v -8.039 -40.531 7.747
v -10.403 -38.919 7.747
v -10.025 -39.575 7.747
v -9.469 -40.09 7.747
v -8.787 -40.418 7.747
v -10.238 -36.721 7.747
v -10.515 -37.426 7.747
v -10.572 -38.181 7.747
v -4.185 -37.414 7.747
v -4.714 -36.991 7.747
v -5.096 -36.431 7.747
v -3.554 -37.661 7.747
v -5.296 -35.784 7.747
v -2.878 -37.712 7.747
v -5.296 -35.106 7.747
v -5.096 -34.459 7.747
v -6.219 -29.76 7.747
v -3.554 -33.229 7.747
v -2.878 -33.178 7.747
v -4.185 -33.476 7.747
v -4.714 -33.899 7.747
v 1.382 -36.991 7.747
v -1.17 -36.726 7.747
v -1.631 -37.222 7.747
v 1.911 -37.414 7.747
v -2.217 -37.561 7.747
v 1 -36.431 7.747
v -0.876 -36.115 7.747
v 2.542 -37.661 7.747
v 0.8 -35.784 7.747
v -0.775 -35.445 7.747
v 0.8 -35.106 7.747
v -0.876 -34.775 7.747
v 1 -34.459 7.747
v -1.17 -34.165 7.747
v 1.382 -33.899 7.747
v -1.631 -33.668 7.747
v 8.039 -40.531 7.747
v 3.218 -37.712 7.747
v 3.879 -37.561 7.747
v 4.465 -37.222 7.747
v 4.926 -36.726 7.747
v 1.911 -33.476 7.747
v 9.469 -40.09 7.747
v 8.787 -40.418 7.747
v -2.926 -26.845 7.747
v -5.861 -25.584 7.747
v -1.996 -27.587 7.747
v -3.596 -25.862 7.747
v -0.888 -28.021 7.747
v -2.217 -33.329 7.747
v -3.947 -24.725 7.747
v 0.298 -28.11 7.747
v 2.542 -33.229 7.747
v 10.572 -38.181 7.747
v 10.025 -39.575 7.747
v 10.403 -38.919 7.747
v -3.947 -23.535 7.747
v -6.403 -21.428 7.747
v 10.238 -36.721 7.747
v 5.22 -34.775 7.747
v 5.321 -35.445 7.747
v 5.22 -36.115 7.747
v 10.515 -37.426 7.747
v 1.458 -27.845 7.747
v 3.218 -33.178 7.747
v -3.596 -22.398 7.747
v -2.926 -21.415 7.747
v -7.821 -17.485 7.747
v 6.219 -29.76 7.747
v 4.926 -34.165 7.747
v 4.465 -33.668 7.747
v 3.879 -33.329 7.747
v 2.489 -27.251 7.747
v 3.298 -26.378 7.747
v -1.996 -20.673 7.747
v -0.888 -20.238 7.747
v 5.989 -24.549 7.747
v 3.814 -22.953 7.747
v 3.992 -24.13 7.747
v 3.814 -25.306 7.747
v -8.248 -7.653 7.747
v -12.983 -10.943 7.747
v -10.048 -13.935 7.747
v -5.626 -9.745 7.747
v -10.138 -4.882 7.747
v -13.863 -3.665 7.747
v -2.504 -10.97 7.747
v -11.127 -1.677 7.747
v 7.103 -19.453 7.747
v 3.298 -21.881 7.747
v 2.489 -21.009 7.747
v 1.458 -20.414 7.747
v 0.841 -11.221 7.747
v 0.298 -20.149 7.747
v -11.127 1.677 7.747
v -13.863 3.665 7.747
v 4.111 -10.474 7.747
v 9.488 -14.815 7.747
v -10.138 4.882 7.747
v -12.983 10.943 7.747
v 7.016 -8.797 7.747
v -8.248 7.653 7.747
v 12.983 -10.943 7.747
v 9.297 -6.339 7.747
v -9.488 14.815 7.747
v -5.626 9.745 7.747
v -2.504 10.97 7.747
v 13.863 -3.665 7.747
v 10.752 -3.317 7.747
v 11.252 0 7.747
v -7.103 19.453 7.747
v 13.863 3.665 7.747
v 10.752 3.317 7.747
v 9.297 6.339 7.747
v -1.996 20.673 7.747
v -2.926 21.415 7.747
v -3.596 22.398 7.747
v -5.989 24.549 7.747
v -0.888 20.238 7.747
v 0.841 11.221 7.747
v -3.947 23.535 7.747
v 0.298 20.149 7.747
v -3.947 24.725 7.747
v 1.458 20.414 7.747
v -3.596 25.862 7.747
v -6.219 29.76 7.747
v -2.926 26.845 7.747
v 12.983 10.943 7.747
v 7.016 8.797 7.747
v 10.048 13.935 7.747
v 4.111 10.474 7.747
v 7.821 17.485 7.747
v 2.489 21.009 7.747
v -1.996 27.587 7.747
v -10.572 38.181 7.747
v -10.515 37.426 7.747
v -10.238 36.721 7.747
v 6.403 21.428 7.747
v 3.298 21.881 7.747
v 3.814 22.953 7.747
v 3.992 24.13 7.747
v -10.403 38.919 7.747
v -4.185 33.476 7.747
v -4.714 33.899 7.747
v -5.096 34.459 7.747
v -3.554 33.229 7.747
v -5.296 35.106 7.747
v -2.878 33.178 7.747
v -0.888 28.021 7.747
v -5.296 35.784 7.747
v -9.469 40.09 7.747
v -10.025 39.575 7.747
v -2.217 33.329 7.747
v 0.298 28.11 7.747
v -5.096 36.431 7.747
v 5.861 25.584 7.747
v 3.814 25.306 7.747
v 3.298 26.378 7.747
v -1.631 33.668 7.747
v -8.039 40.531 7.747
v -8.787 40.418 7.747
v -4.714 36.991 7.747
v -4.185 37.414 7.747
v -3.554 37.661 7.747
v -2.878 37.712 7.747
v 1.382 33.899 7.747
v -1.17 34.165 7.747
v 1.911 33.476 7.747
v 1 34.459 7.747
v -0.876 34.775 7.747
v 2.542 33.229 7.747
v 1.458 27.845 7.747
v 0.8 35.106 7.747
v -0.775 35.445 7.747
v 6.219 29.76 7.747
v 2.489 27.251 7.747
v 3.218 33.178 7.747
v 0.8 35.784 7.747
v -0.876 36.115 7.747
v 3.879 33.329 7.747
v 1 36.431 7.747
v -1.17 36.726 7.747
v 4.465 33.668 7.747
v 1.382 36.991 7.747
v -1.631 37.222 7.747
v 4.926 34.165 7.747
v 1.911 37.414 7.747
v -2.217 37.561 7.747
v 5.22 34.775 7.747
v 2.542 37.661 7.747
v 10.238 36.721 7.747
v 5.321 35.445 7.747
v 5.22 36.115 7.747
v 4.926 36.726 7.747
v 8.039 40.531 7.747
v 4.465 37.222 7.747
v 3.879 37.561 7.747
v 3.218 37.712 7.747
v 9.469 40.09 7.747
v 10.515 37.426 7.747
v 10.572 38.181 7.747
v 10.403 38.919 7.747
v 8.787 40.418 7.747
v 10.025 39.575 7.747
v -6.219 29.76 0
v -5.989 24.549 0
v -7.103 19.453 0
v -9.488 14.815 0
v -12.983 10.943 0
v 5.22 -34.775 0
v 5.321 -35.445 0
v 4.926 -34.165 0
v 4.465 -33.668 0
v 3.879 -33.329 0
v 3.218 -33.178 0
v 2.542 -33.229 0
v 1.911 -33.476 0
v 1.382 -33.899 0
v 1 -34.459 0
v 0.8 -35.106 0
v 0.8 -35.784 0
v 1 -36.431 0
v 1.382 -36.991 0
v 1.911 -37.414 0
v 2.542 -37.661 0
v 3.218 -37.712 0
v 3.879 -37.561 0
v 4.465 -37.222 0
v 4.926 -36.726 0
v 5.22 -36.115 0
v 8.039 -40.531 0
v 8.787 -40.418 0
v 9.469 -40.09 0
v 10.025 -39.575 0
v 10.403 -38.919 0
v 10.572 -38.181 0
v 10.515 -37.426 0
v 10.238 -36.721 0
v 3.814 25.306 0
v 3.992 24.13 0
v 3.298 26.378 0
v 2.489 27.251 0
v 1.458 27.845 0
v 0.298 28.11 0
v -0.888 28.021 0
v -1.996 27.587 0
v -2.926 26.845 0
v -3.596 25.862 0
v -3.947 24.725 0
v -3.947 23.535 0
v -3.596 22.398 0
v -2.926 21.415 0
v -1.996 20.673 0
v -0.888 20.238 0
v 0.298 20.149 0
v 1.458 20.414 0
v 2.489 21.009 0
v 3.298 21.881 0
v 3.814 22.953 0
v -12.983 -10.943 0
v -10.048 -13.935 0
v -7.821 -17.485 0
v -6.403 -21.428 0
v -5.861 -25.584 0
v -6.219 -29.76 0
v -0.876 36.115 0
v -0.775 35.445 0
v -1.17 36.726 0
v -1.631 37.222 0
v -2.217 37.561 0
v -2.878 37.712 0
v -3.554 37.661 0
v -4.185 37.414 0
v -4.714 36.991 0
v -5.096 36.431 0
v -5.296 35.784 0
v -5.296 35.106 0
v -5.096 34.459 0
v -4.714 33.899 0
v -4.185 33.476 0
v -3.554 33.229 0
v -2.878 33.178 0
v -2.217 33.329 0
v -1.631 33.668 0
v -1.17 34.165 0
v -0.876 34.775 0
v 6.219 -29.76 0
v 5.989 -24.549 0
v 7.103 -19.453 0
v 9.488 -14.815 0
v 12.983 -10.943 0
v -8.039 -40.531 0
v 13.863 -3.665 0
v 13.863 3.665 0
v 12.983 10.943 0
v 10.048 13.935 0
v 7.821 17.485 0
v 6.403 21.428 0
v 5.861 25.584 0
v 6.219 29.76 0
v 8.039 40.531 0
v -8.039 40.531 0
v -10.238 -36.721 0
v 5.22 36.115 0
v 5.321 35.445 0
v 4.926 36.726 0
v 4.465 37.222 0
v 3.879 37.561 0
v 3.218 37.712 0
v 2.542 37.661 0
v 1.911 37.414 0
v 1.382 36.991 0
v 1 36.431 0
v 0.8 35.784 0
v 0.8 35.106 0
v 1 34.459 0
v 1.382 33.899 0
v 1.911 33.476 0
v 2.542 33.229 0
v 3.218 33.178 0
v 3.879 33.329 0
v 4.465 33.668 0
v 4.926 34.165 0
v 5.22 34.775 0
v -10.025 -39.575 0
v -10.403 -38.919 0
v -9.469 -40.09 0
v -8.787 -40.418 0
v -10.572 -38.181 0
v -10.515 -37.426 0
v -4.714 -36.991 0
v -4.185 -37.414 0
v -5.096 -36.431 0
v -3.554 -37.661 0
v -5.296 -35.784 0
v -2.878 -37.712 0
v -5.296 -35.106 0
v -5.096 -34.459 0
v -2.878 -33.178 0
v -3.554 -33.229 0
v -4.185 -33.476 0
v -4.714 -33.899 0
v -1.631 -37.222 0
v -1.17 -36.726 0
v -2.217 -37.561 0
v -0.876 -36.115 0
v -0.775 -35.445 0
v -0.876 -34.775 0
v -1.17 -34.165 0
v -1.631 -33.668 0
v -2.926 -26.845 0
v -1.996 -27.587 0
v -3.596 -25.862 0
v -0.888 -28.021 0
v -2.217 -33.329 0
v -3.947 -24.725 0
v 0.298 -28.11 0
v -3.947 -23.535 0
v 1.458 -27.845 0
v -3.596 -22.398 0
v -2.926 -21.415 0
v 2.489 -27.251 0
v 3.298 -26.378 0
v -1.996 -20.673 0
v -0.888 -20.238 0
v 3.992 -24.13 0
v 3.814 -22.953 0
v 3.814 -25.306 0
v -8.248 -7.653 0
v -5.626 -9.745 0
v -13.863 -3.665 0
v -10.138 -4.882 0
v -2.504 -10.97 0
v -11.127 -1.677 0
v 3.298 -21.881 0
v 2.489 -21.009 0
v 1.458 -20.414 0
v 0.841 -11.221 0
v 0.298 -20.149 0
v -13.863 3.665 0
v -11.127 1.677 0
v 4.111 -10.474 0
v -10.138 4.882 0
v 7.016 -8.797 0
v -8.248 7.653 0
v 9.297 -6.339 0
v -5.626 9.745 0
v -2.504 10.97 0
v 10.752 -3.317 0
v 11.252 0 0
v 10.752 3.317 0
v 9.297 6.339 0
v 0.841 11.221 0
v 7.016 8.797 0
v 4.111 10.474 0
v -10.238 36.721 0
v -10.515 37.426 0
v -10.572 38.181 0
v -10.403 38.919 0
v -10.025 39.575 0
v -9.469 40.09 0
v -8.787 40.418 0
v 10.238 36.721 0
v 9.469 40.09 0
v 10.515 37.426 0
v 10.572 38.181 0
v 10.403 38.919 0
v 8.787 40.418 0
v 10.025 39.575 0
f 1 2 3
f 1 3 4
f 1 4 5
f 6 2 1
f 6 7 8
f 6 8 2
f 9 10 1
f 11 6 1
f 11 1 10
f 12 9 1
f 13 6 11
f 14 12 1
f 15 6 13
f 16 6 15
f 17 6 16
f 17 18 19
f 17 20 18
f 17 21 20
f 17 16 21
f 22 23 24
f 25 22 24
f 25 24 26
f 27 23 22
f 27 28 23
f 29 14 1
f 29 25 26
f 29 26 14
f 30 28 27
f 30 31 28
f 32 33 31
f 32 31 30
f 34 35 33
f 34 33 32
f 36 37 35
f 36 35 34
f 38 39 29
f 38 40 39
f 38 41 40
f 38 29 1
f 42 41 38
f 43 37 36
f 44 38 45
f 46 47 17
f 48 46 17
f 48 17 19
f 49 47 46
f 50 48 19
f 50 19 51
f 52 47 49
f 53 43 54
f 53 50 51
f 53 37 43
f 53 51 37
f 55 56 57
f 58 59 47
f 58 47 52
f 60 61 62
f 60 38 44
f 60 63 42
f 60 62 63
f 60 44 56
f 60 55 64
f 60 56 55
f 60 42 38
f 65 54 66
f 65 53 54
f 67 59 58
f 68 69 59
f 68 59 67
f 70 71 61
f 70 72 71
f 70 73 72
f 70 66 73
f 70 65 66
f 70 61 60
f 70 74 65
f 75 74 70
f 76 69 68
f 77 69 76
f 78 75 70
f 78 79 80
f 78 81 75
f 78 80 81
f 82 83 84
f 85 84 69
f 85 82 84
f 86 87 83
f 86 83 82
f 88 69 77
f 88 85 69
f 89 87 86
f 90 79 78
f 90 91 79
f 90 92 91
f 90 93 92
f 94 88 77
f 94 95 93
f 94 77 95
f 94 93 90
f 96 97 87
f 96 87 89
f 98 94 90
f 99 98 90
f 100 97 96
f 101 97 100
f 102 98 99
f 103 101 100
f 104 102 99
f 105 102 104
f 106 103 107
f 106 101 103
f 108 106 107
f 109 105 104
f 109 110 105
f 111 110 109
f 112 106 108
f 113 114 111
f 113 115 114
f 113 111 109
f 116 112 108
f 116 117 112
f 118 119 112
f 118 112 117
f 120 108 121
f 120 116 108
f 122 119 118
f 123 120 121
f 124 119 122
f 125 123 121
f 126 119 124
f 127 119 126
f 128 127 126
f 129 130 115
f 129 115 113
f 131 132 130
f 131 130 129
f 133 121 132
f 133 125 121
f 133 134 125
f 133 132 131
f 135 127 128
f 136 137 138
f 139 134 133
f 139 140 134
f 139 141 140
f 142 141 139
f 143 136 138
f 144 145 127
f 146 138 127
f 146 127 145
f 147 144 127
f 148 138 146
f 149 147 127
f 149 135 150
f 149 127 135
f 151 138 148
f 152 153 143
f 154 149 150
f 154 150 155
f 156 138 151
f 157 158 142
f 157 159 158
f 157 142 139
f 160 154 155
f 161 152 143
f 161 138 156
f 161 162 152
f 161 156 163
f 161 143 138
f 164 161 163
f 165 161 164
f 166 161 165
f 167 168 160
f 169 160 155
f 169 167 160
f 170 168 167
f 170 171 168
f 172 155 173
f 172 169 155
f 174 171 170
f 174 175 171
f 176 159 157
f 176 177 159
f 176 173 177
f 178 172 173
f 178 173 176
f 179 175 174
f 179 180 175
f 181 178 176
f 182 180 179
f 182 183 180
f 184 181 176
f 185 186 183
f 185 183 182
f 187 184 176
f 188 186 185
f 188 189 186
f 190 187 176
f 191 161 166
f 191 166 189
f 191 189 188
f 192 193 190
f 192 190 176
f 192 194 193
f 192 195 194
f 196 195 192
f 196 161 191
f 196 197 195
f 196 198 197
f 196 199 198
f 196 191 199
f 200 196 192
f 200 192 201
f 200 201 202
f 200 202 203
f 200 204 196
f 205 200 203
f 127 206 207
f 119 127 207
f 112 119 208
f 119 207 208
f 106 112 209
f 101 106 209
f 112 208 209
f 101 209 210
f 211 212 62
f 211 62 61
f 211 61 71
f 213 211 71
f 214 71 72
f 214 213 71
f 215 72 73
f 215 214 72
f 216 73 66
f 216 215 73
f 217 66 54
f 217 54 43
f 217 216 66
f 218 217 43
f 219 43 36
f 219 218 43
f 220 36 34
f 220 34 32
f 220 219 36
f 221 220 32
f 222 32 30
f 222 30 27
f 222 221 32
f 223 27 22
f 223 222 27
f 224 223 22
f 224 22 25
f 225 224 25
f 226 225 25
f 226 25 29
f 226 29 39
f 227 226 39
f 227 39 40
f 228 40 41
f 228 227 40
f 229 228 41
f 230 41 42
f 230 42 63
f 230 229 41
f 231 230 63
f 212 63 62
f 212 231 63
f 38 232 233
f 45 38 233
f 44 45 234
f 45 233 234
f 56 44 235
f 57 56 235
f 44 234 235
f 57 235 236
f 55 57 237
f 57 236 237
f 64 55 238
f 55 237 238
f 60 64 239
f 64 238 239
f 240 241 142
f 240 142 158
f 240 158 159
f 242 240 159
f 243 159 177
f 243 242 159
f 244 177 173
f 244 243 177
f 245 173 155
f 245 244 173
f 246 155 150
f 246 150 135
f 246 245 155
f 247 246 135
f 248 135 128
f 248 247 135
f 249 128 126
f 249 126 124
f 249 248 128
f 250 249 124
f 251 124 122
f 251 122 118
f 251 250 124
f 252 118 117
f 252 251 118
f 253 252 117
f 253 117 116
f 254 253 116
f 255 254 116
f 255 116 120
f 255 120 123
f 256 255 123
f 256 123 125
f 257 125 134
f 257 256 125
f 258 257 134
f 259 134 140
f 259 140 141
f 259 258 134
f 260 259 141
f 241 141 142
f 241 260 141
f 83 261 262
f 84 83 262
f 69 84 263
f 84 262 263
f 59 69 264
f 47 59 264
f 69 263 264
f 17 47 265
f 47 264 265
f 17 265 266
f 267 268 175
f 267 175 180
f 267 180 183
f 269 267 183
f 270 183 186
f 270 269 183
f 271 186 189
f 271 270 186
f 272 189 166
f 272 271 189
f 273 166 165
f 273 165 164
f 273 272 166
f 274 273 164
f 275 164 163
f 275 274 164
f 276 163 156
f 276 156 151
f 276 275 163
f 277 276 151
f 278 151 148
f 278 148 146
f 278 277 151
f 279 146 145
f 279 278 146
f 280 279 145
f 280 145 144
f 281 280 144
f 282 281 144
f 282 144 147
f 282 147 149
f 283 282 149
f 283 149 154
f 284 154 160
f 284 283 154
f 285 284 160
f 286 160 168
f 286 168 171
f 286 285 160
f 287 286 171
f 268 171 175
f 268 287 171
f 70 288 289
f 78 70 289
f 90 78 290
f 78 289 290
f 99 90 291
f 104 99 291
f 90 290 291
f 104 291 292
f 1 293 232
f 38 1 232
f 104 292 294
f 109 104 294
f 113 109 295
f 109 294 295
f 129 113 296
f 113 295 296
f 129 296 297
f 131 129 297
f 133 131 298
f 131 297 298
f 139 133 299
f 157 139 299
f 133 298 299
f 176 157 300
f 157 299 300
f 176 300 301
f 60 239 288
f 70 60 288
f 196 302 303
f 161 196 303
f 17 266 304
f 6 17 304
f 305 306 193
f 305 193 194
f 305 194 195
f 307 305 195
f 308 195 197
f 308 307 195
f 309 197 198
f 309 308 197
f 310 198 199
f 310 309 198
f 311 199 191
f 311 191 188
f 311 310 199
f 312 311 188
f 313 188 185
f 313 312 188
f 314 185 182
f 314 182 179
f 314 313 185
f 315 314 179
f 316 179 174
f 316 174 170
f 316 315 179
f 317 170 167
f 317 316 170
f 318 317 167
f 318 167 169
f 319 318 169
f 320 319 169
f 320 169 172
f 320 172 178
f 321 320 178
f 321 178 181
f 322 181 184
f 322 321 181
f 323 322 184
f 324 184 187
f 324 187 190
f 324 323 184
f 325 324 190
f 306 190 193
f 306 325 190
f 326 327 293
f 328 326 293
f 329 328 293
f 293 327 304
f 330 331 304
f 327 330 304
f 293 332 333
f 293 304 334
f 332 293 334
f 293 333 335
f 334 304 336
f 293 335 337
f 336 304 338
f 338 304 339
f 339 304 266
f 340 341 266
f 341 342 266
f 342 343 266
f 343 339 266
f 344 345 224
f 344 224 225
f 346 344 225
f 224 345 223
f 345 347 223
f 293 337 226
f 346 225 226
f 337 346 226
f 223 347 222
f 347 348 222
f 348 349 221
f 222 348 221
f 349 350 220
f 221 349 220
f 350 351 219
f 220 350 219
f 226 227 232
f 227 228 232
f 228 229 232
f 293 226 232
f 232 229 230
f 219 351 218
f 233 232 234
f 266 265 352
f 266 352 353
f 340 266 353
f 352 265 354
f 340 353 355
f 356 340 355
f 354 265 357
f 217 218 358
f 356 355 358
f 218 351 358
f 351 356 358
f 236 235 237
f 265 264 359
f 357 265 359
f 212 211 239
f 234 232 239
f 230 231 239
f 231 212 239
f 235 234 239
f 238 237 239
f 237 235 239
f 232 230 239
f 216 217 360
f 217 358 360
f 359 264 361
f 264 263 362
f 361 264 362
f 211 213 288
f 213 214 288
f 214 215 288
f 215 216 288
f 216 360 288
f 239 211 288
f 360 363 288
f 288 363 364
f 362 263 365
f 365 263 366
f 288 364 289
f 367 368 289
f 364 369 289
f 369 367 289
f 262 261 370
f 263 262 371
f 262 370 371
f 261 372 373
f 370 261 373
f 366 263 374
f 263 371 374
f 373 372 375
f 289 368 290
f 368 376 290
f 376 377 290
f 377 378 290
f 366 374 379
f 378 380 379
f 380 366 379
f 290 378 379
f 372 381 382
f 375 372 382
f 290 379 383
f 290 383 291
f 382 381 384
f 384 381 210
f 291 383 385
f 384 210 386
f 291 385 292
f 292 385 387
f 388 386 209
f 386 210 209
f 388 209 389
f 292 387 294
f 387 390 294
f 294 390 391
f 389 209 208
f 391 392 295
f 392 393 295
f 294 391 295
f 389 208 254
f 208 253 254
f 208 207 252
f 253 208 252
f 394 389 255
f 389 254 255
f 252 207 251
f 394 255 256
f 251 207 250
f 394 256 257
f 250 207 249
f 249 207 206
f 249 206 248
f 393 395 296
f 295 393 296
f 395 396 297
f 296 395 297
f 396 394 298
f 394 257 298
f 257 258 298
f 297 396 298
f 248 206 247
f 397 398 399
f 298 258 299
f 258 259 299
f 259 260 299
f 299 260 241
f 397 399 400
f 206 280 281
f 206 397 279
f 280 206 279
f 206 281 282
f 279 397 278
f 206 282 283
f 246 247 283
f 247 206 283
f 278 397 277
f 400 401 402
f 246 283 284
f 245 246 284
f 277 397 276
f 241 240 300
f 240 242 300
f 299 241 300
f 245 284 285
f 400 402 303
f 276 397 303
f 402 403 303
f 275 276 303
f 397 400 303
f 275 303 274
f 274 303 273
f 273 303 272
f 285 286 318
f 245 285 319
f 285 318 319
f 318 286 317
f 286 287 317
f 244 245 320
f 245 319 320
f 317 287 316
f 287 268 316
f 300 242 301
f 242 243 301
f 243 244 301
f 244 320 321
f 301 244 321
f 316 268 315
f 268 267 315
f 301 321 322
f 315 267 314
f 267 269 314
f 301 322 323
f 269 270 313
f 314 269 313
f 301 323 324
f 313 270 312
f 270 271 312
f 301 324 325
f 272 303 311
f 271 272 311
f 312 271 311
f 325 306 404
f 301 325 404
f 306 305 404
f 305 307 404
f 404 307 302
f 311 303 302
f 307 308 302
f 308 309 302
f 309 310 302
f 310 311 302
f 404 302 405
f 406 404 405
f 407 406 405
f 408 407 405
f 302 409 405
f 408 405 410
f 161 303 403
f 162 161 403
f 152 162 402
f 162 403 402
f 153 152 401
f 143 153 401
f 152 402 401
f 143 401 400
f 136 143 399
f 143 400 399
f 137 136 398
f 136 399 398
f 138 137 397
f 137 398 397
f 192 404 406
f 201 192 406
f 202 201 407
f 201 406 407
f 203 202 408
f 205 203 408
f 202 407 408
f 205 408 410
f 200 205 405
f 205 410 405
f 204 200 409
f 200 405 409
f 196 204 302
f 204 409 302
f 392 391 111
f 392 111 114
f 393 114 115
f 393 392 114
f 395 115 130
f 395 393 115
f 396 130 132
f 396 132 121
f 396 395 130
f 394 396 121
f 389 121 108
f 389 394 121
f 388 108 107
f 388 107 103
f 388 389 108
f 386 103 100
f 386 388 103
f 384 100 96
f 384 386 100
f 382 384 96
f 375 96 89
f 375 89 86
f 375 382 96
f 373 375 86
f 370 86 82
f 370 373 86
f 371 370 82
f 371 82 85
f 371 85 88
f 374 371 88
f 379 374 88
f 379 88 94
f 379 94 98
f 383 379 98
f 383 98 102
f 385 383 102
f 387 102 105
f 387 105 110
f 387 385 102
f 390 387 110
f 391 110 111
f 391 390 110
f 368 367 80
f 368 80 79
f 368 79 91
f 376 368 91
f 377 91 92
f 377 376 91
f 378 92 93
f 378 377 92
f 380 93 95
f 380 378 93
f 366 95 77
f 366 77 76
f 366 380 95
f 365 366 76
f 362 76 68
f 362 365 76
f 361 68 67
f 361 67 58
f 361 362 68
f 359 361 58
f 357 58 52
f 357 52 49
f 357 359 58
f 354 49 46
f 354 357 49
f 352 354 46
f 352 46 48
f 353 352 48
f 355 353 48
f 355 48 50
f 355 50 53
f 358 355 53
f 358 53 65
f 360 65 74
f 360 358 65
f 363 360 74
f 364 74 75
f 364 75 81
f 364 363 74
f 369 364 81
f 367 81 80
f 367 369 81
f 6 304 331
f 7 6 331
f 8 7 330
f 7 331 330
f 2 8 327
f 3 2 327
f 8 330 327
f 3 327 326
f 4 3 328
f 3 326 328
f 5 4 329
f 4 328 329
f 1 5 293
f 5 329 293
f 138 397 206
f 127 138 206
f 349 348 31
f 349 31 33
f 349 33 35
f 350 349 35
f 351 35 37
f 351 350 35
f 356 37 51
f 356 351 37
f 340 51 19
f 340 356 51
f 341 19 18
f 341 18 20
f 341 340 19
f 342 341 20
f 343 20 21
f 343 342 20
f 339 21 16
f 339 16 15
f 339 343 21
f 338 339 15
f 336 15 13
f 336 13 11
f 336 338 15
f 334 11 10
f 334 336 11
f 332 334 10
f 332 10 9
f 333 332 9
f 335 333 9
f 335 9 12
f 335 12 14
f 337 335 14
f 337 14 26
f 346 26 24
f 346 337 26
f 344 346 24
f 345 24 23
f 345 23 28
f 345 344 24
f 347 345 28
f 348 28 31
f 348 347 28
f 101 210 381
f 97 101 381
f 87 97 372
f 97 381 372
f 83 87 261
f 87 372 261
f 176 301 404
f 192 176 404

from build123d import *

# Parameters (mm, degrees)
F0_R     = 2.2733
F0_R_2   = 3.991558
F0_R_3   = 11.2522
F1_DEPTH = 7.747


with BuildPart() as f1:
    # F0 (on Top) → F1 (new body)
    with BuildSketch(Plane.XY):
        with BuildLine():
            Line((-10.238358, 36.721247), (-6.219031, 29.75957))
            ThreePointArc((-6.219031, 29.75957), (-7.103307, 19.453476), (-12.983067, 10.943133))
            ThreePointArc((-12.983067, 10.943133), (-13.972901, 0), (-12.983067, -10.943133))
            ThreePointArc((-12.983067, -10.943133), (-7.005384, -19.418275), (-6.219031, -29.75957))
            Line((-6.219031, -29.75957), (-10.238358, -36.721247))
            ThreePointArc((-10.238358, -36.721247), (-10.238358, -39.261247), (-8.038653, -40.531247))
            Line((-8.038653, -40.531247), (8.038653, -40.531247))
            ThreePointArc((8.038653, -40.531247), (10.238358, -39.261247), (10.238358, -36.721247))
            Line((10.238358, -36.721247), (6.219031, -29.75957))
            ThreePointArc((6.219031, -29.75957), (7.103307, -19.453476), (12.983067, -10.943133))
            ThreePointArc((12.983067, -10.943133), (13.972901, 0), (12.983067, 10.943133))
            ThreePointArc((12.983067, 10.943133), (7.005384, 19.418275), (6.219031, 29.75957))
            Line((6.219031, 29.75957), (10.238358, 36.721247))
            ThreePointArc((10.238358, 36.721247), (10.238358, 39.261247), (8.038653, 40.531247))
            Line((8.038653, 40.531247), (-8.038653, 40.531247))
            ThreePointArc((-8.038653, 40.531247), (-10.238358, 39.261247), (-10.238358, 36.721247))
        make_face()
        with Locations((-3.048, -35.44515)):
            Circle(F0_R, mode=Mode.SUBTRACT)
        with Locations((0, -24.129855)):
            Circle(F0_R_2, mode=Mode.SUBTRACT)
        with Locations((3.048, -35.44515)):
            Circle(F0_R, mode=Mode.SUBTRACT)
        Circle(F0_R_3, mode=Mode.SUBTRACT)
        with Locations((0, 24.129855)):
            Circle(F0_R_2, mode=Mode.SUBTRACT)
        with Locations((-3.048, 35.44515)):
            Circle(F0_R, mode=Mode.SUBTRACT)
        with Locations((3.048, 35.44515)):
            Circle(F0_R, mode=Mode.SUBTRACT)
    extrude(amount=F1_DEPTH)


solid = f1.part
